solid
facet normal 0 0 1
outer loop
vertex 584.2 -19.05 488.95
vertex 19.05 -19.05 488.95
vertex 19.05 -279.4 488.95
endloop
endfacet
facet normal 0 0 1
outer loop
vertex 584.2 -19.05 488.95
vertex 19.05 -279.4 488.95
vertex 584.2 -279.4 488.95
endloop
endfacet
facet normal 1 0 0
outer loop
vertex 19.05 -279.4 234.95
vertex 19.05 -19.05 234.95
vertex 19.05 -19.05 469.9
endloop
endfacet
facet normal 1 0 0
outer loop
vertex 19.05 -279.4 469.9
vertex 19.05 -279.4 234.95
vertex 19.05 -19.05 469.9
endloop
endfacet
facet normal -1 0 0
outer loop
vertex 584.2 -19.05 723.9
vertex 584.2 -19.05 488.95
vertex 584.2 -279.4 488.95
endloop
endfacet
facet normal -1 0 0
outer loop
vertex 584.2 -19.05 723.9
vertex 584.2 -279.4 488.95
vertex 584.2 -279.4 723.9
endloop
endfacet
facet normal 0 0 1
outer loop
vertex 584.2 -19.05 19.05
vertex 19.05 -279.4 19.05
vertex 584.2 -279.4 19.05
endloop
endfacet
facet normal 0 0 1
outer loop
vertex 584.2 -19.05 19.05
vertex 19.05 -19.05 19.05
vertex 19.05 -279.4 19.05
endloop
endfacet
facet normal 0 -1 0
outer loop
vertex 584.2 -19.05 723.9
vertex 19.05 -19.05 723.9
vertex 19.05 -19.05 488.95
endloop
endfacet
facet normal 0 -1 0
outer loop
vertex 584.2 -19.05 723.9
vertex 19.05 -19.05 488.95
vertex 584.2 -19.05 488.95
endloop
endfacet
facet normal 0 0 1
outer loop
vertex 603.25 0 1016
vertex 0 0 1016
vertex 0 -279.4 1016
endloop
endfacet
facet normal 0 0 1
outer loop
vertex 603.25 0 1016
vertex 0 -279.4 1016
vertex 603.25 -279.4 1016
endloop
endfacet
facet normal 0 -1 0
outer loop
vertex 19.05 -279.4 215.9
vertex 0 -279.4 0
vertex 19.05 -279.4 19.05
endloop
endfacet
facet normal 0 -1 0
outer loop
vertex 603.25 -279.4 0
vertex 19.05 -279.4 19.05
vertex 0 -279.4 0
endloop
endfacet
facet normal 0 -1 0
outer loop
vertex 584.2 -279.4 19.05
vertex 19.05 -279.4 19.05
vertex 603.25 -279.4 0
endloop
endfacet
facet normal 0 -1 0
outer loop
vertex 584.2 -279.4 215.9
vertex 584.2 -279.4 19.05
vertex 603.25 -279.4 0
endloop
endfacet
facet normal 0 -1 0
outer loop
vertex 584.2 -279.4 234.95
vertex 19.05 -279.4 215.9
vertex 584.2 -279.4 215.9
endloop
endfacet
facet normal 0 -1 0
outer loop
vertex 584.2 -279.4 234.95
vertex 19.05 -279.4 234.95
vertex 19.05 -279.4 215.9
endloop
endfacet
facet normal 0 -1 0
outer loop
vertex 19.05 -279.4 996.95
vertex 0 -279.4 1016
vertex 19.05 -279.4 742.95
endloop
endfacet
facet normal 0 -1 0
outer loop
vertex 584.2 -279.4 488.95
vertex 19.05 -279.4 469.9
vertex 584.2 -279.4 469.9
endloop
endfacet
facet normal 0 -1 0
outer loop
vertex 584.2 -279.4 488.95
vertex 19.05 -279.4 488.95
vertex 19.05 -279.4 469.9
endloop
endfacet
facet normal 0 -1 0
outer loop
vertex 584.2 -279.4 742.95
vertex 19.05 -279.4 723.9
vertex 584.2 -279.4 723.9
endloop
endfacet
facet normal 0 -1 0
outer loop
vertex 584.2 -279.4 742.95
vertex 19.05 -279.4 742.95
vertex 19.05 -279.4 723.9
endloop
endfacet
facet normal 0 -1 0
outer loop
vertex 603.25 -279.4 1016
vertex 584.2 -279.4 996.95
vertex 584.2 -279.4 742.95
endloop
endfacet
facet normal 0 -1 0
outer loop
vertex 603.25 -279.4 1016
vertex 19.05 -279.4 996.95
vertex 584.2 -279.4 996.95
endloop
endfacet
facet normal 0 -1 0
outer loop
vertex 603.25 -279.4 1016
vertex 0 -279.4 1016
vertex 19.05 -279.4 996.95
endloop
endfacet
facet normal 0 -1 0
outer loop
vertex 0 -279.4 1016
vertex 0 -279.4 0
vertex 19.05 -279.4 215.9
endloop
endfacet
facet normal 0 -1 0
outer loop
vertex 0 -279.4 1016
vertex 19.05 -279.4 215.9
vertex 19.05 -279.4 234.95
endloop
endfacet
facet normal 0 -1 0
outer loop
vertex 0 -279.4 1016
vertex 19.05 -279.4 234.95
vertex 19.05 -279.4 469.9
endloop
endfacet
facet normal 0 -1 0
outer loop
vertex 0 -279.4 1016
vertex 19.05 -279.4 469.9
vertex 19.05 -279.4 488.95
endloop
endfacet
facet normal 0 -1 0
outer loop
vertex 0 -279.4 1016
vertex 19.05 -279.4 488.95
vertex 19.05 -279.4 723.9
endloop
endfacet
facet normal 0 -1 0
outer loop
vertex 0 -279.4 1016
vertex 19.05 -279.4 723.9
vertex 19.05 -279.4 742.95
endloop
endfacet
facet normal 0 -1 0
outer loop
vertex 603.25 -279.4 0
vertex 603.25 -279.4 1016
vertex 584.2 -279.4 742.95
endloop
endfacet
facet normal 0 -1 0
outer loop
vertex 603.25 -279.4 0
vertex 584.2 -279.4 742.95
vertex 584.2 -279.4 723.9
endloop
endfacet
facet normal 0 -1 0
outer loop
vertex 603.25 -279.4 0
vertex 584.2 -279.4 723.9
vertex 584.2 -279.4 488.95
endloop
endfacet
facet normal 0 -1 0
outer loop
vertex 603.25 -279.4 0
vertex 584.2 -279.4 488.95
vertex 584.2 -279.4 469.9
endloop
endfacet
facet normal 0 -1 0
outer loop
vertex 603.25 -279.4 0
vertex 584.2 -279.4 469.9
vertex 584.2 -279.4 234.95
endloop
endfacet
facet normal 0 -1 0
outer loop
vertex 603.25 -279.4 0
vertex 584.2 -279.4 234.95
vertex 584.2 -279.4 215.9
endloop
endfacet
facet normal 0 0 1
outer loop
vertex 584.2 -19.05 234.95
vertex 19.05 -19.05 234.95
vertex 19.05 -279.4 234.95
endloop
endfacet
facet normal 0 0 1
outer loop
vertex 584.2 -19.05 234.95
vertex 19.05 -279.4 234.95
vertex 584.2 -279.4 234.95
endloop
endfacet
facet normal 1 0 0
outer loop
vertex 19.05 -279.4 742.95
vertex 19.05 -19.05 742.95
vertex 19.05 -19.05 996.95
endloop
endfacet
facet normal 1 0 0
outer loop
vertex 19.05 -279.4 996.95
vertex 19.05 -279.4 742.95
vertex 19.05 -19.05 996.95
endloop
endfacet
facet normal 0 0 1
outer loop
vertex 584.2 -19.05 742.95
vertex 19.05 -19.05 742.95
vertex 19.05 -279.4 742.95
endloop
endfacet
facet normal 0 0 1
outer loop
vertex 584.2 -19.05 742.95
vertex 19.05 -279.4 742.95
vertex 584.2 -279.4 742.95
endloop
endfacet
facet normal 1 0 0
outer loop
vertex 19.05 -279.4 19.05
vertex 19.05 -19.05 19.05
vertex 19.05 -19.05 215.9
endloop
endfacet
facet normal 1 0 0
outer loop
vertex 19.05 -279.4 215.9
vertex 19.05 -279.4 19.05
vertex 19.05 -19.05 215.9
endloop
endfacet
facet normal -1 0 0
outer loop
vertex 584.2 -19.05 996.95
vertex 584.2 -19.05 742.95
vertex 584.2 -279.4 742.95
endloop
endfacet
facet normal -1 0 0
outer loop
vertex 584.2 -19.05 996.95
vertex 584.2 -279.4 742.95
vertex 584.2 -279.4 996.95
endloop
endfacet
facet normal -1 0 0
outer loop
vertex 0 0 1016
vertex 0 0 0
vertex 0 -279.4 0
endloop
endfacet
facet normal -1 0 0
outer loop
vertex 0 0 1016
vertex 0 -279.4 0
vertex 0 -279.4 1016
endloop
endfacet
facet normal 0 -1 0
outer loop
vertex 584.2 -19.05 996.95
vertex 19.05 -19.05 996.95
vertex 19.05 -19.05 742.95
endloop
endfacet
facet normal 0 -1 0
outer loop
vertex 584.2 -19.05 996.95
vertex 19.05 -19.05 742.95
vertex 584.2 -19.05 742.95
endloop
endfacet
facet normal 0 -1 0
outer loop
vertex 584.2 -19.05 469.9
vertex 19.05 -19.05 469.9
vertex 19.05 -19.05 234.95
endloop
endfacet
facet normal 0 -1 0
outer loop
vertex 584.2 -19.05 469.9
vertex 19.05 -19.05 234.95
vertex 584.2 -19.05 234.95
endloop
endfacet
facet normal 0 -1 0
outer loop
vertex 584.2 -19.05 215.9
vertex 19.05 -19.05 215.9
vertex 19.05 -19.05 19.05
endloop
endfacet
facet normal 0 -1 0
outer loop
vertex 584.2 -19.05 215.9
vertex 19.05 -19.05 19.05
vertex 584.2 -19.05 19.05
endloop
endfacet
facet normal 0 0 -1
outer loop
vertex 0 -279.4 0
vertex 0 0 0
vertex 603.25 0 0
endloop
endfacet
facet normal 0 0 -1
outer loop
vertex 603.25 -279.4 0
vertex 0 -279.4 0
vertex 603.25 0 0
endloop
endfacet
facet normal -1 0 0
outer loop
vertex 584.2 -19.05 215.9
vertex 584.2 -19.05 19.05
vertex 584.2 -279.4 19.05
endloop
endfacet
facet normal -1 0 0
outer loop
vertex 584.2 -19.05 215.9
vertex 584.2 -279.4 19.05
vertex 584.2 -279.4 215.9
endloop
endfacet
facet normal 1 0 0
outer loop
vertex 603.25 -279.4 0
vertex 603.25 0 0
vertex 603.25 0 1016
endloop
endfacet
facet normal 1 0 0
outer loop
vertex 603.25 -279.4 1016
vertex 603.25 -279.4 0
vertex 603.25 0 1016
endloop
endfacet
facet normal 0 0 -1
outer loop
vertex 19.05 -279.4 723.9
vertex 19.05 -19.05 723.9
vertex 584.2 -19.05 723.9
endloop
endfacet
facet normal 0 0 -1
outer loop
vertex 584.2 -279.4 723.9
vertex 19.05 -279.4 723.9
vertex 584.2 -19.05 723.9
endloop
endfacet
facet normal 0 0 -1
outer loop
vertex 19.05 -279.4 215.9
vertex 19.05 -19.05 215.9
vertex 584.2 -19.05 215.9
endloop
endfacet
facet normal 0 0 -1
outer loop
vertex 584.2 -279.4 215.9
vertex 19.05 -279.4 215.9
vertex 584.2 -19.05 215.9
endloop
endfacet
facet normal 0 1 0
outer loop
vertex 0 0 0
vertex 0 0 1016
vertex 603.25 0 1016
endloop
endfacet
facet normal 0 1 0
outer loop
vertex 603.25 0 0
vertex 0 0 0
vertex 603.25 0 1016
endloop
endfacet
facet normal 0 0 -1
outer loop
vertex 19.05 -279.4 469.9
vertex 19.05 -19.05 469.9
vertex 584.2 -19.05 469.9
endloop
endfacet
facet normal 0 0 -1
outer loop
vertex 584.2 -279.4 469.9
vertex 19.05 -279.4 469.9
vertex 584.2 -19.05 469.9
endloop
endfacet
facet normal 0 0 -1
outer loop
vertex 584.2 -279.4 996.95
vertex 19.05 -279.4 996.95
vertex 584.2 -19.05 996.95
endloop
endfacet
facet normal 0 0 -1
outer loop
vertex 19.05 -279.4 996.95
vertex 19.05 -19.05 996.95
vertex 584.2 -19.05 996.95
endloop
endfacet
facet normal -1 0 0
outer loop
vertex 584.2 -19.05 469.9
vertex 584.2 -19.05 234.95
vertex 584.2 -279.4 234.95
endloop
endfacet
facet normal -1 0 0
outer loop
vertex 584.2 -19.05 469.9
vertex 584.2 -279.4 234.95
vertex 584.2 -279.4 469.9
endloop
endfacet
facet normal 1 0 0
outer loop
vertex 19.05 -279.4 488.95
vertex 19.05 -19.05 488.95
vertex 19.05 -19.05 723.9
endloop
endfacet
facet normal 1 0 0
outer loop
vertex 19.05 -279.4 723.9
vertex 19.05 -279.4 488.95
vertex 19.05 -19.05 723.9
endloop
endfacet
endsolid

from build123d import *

# Parameters (mm, degrees)
F0_W     = 603.25
F0_H     = 1016
F1_DEPTH = 279.4
F2_T     = -19.05
F3_W     = 565.15
F3_H     = 19.05
F4_DEPTH = 260.35


with BuildPart() as f1:
    # F0 (on Front) → F1 (new body)
    with BuildSketch(Plane.XZ):
        with Locations((301.625, 508)):
            Rectangle(F0_W, F0_H)
    extrude(amount=F1_DEPTH)

    # F2
    f2_openings = [f1.faces().sort_by_distance(p)[0] for p in [
        (301.625, -279.4, 508),
    ]]
    offset(amount=F2_T, openings=f2_openings)

    # F3 (on face) → F4 (join)
    with BuildSketch(Plane.XZ.offset(19.05)):
        with Locations((301.625, 733.425)):
            Rectangle(F3_W, F3_H)
        with Locations((301.625, 479.425)):
            Rectangle(F3_W, F3_H)
        with Locations((301.625, 225.425)):
            Rectangle(F3_W, F3_H)
    extrude(amount=F4_DEPTH)


solid = f1.part
